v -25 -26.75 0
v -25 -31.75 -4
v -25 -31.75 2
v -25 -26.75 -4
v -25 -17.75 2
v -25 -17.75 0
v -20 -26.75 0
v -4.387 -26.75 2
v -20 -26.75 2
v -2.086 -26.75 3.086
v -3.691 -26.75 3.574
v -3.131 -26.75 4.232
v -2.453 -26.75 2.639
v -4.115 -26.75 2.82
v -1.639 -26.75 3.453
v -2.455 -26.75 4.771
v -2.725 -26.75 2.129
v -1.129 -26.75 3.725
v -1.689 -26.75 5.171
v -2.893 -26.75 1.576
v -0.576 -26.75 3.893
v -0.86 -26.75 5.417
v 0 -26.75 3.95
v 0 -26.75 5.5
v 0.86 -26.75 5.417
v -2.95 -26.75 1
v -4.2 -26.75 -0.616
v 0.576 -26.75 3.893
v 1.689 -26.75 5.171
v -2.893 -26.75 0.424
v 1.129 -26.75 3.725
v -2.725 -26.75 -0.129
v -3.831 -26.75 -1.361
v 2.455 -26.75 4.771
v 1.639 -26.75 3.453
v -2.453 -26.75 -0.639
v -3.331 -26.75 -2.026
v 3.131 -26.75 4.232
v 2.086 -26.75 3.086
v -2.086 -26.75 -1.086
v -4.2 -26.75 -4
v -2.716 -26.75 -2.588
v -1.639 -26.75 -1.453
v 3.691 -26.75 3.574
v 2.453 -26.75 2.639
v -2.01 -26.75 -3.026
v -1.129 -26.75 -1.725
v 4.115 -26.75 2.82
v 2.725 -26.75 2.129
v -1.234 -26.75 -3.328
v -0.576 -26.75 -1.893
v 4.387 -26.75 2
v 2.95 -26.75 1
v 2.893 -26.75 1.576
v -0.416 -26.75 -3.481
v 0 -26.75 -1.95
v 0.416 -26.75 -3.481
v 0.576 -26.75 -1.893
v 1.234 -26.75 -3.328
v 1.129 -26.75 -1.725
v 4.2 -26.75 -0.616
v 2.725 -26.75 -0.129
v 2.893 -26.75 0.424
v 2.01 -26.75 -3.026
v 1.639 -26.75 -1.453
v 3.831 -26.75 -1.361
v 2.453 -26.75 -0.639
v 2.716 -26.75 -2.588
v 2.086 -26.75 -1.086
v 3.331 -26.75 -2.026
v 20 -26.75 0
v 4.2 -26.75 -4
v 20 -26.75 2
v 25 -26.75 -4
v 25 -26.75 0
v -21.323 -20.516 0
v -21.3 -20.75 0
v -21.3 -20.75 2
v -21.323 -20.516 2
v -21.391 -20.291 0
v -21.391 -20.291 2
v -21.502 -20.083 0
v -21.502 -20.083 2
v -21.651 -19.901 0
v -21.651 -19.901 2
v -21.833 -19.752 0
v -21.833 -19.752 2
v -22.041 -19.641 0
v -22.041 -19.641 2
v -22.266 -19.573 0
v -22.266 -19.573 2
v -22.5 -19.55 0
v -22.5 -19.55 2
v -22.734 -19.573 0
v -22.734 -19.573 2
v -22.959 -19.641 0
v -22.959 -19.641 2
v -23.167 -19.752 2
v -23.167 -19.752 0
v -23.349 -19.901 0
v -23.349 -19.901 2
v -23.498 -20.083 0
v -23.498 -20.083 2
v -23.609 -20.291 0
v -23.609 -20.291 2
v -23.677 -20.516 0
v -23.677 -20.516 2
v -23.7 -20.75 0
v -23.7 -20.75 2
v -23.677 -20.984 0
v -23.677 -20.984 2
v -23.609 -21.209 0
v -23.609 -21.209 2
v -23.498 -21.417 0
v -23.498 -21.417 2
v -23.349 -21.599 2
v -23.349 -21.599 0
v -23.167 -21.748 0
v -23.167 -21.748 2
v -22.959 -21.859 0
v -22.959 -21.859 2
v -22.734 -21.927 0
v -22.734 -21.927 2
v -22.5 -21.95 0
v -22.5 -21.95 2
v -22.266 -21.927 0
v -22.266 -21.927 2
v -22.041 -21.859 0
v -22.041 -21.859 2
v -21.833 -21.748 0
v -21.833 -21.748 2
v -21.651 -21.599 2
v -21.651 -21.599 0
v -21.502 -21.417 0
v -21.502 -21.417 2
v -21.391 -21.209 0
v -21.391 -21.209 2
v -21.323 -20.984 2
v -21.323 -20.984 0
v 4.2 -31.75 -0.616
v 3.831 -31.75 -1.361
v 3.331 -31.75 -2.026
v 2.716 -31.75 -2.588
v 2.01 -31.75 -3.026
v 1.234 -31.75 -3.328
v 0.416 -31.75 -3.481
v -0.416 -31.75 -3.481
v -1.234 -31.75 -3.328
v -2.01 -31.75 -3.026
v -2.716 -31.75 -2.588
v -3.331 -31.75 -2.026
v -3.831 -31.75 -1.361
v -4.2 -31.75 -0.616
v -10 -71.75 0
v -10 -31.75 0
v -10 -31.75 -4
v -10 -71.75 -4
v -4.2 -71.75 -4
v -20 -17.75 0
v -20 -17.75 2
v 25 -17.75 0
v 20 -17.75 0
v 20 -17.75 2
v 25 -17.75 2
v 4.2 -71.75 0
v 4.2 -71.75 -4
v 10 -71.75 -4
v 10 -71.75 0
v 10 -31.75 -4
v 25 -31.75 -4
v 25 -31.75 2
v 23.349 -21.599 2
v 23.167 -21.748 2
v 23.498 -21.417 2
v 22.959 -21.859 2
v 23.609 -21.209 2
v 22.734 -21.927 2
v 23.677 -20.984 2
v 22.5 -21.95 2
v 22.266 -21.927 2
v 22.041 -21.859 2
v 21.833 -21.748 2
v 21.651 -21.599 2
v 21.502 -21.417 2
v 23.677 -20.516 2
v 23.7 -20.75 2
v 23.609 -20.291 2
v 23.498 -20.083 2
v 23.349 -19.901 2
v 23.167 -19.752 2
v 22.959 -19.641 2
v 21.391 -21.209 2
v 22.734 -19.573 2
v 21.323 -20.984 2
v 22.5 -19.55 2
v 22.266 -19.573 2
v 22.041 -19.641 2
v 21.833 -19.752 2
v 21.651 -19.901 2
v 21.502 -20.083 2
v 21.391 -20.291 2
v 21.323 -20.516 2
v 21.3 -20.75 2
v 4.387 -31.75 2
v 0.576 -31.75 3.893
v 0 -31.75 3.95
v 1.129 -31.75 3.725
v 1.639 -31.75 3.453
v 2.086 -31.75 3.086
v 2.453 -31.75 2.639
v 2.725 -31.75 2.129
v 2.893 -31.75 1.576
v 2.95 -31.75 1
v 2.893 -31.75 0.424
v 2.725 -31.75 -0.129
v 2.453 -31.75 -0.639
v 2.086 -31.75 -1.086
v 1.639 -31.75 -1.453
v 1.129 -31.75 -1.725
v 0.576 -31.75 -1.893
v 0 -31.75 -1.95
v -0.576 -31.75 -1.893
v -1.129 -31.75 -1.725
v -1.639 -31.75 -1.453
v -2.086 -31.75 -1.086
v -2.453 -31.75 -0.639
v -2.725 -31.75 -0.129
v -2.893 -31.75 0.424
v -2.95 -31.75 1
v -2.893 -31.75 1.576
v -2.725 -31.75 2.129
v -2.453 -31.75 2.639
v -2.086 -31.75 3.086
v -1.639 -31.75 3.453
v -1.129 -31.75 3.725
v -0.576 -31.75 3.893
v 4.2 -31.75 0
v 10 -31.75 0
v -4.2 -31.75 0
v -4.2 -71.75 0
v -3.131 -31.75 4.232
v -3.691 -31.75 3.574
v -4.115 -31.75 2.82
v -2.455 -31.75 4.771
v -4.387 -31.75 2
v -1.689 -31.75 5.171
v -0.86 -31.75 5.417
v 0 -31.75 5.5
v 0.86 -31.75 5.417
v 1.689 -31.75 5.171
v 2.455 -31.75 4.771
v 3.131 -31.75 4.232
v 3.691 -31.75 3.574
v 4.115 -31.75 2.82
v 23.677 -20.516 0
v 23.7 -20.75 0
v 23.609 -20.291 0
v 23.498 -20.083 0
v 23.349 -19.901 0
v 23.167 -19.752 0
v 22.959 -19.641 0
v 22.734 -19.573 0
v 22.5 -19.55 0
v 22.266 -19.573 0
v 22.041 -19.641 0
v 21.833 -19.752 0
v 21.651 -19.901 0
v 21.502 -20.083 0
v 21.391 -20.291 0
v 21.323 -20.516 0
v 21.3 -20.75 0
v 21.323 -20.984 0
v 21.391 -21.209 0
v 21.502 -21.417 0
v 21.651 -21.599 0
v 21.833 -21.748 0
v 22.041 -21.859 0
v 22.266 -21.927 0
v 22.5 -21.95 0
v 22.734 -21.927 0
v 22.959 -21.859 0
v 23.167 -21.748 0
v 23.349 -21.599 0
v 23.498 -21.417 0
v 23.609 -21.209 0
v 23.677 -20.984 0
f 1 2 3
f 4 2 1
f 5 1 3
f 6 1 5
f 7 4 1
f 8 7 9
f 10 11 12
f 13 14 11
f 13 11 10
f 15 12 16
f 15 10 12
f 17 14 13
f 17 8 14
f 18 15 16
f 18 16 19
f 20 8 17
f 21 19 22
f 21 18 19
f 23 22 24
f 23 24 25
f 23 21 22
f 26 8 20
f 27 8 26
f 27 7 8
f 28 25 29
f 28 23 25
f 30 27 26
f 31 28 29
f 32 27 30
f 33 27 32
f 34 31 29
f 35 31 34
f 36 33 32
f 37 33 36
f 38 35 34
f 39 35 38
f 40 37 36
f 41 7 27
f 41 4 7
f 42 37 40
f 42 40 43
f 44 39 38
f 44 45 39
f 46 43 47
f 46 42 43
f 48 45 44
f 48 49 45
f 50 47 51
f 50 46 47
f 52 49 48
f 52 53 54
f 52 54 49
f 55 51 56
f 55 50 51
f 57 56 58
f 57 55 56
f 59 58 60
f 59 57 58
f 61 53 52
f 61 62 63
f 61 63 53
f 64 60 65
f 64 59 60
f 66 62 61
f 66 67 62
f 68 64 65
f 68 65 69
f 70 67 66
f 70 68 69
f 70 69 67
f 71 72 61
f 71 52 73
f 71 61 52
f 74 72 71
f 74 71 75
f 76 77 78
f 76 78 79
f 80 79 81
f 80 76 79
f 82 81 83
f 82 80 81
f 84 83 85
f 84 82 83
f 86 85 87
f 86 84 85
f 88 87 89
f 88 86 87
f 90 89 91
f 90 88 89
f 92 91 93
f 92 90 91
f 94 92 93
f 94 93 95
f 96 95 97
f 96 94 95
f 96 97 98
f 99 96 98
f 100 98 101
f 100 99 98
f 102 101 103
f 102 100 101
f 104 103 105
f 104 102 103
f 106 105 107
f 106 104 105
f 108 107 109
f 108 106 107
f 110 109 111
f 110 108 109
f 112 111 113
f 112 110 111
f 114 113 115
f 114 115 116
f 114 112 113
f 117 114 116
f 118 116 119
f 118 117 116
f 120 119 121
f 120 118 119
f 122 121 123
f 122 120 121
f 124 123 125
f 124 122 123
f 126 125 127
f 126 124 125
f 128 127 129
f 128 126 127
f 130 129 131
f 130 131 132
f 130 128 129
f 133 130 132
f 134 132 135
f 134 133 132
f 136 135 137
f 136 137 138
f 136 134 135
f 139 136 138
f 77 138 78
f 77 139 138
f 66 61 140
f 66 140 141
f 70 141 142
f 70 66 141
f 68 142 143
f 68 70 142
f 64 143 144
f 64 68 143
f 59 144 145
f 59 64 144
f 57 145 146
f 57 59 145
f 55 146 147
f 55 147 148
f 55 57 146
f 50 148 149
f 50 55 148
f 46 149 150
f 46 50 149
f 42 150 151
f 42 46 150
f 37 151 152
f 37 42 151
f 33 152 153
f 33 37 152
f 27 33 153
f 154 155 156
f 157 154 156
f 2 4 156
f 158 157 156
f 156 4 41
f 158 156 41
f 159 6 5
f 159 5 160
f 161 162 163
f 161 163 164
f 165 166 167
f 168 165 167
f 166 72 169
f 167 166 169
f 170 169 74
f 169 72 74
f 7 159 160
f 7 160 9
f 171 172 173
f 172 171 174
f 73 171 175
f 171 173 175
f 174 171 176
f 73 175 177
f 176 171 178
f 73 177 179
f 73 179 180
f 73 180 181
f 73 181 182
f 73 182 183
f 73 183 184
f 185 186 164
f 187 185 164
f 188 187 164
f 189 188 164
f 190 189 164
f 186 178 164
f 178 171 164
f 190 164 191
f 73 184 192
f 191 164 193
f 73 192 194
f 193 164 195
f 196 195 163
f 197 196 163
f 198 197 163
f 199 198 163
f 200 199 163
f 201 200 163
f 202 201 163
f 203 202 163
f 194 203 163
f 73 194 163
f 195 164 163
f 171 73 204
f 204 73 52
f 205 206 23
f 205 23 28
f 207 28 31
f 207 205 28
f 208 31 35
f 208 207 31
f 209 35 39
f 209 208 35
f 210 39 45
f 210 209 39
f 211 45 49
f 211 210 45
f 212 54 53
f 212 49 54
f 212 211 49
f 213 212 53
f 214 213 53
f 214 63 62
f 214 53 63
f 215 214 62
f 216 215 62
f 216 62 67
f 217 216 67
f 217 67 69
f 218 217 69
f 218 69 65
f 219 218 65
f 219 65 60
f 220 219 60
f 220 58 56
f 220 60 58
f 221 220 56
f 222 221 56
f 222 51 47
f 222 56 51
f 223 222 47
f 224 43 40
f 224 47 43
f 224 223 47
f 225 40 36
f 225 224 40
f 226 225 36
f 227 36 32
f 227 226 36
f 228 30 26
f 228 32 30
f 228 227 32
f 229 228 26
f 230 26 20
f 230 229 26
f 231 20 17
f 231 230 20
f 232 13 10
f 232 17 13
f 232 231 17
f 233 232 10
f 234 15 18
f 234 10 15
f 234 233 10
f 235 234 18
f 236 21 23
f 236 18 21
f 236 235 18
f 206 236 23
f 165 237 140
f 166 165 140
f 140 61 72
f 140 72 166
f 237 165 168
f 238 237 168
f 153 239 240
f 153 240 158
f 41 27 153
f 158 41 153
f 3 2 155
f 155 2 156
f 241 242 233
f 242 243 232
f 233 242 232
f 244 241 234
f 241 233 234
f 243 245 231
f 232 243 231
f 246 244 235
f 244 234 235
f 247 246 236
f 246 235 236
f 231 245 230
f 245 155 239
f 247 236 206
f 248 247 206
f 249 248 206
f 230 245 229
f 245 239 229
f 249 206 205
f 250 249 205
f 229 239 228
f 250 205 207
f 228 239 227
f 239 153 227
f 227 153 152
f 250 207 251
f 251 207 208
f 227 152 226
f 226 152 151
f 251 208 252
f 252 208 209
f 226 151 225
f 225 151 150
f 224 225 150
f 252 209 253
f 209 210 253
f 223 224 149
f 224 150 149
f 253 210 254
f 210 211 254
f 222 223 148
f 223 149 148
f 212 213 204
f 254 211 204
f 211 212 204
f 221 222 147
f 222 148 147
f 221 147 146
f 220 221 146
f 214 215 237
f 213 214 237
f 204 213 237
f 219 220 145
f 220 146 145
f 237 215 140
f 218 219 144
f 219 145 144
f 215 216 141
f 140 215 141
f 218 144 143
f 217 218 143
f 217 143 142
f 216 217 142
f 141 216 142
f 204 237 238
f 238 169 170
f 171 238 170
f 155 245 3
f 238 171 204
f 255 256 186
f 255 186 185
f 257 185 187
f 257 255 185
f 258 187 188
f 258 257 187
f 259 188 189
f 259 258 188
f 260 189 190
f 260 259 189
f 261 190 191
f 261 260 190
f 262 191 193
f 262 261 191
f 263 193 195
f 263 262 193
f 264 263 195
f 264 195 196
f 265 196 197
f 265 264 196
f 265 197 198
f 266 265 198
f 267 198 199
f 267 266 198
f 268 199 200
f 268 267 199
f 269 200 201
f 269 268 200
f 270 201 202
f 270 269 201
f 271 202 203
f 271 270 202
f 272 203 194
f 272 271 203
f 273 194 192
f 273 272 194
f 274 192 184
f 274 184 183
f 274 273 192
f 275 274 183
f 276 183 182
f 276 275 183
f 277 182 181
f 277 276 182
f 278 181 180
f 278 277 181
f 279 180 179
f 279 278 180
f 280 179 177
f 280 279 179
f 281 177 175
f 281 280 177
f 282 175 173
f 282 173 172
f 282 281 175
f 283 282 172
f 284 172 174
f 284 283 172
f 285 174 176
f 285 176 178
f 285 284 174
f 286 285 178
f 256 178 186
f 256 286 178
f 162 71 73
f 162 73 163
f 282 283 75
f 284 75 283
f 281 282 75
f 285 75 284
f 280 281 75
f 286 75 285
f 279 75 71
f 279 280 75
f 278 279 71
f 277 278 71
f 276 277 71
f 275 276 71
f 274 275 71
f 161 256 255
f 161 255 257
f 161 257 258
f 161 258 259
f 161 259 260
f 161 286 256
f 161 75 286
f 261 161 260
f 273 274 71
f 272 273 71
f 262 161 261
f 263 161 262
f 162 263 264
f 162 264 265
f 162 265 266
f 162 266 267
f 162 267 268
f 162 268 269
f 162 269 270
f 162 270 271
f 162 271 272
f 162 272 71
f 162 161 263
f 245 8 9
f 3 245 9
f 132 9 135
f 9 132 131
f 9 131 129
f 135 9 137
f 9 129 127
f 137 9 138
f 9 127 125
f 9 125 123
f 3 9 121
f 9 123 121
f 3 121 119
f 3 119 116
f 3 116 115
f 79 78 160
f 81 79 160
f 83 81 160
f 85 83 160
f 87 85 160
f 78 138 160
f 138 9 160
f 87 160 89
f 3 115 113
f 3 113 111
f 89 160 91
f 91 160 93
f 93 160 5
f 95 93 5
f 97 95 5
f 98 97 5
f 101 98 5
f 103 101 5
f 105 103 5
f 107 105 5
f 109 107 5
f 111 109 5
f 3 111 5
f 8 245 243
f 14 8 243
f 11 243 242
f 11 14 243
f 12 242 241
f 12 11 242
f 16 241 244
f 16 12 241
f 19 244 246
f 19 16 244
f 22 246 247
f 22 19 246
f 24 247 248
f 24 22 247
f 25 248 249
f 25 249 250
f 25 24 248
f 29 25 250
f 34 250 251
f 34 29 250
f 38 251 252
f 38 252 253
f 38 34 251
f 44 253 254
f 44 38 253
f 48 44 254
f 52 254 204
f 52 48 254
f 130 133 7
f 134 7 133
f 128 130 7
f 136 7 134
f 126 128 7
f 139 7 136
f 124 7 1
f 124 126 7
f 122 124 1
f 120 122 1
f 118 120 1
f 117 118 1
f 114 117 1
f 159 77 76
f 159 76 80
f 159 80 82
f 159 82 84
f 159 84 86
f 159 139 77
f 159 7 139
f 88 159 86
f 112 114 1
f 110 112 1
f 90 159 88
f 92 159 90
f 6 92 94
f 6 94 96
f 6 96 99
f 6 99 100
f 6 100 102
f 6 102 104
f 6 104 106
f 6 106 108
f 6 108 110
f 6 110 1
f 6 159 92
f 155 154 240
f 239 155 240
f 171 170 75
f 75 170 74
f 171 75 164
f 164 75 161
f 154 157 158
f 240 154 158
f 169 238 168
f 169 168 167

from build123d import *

# Parameters (mm, degrees)
BOSS_EXTRUDE1_START     = 26.5
SKETCH2_R               = 1.2
BOSS_EXTRUDE1_DEPTH     = 2
BOSS_EXTRUDE2_START     = -26.75
SKETCH3_R               = 4.5
BOSS_EXTRUDE2_DEPTH     = 5
CUT_EXTRUDE1_DEPTH      = 41.783728373
CUT_EXTRUDE1_DEPTH_BACK = 41.783728373
SKETCH4_R               = 2.95
BOSS_EXTRUDE3_START     = -4
SKETCH5_W               = 15
SKETCH5_H               = 5
BOSS_EXTRUDE3_DEPTH     = 4
BOSS_EXTRUDE6_START     = -26.75
SKETCH6_W               = 5.8
SKETCH6_H               = 4
BOSS_EXTRUDE6_DEPTH     = 45


with BuildPart() as part:
    # Sketch2 → Boss-Extrude1 (new body)
    with BuildSketch(Plane.XY.offset(-26.5).offset(BOSS_EXTRUDE1_START)):
        Polygon((-25, -17.75), (-20, -17.75), (-20, -26.75), (20, -26.75), (20, -17.75), (25, -17.75), (25, -31.75), (-25, -31.75), align=None)
        with Locations((22.5, -20.75)):
            Circle(SKETCH2_R, mode=Mode.SUBTRACT)
        with Locations((-22.5, -20.75)):
            Circle(SKETCH2_R, mode=Mode.SUBTRACT)
    extrude(amount=BOSS_EXTRUDE1_DEPTH)

    # Sketch3 → Boss-Extrude2 (add)
    with BuildSketch(Plane(origin=(0, 0, 0), x_dir=(1, 0, 0), z_dir=(0, 1, 0)).offset(BOSS_EXTRUDE2_START)):
        with Locations((0, -1)):
            Circle(SKETCH3_R)
    extrude(amount=-BOSS_EXTRUDE2_DEPTH)

    # Sketch4 → Cut-Extrude1 (cut, two sides: drawn at the far end of the back side and taken through both)
    with BuildSketch(Plane(origin=(0, 0, 0), x_dir=(1, 0, 0), z_dir=(0, 1, 0)).offset(-CUT_EXTRUDE1_DEPTH_BACK)):
        with Locations(Location((0, -1, 0), (0, 0, 270))):
            Circle(SKETCH4_R)
    extrude(amount=CUT_EXTRUDE1_DEPTH + CUT_EXTRUDE1_DEPTH_BACK, mode=Mode.SUBTRACT)

    # Sketch5 → Boss-Extrude3 (add)
    with BuildSketch(Plane.XY.offset(BOSS_EXTRUDE3_START)):
        with Locations((17.5, -29.25)):
            Rectangle(SKETCH5_W, SKETCH5_H)
        with Locations((-17.5, -29.25)):
            Rectangle(SKETCH5_W, SKETCH5_H)
    extrude(amount=BOSS_EXTRUDE3_DEPTH)

    # Sketch6 → Boss-Extrude6 (add)
    with BuildSketch(Plane(origin=(0, 0, 0), x_dir=(1, 0, 0), z_dir=(0, 1, 0)).offset(BOSS_EXTRUDE6_START)):
        with Locations((7.1, 2)):
            Rectangle(SKETCH6_W, SKETCH6_H)
        with Locations((-7.1, 2)):
            Rectangle(SKETCH6_W, SKETCH6_H)
    extrude(amount=-BOSS_EXTRUDE6_DEPTH)


solid = part.part
